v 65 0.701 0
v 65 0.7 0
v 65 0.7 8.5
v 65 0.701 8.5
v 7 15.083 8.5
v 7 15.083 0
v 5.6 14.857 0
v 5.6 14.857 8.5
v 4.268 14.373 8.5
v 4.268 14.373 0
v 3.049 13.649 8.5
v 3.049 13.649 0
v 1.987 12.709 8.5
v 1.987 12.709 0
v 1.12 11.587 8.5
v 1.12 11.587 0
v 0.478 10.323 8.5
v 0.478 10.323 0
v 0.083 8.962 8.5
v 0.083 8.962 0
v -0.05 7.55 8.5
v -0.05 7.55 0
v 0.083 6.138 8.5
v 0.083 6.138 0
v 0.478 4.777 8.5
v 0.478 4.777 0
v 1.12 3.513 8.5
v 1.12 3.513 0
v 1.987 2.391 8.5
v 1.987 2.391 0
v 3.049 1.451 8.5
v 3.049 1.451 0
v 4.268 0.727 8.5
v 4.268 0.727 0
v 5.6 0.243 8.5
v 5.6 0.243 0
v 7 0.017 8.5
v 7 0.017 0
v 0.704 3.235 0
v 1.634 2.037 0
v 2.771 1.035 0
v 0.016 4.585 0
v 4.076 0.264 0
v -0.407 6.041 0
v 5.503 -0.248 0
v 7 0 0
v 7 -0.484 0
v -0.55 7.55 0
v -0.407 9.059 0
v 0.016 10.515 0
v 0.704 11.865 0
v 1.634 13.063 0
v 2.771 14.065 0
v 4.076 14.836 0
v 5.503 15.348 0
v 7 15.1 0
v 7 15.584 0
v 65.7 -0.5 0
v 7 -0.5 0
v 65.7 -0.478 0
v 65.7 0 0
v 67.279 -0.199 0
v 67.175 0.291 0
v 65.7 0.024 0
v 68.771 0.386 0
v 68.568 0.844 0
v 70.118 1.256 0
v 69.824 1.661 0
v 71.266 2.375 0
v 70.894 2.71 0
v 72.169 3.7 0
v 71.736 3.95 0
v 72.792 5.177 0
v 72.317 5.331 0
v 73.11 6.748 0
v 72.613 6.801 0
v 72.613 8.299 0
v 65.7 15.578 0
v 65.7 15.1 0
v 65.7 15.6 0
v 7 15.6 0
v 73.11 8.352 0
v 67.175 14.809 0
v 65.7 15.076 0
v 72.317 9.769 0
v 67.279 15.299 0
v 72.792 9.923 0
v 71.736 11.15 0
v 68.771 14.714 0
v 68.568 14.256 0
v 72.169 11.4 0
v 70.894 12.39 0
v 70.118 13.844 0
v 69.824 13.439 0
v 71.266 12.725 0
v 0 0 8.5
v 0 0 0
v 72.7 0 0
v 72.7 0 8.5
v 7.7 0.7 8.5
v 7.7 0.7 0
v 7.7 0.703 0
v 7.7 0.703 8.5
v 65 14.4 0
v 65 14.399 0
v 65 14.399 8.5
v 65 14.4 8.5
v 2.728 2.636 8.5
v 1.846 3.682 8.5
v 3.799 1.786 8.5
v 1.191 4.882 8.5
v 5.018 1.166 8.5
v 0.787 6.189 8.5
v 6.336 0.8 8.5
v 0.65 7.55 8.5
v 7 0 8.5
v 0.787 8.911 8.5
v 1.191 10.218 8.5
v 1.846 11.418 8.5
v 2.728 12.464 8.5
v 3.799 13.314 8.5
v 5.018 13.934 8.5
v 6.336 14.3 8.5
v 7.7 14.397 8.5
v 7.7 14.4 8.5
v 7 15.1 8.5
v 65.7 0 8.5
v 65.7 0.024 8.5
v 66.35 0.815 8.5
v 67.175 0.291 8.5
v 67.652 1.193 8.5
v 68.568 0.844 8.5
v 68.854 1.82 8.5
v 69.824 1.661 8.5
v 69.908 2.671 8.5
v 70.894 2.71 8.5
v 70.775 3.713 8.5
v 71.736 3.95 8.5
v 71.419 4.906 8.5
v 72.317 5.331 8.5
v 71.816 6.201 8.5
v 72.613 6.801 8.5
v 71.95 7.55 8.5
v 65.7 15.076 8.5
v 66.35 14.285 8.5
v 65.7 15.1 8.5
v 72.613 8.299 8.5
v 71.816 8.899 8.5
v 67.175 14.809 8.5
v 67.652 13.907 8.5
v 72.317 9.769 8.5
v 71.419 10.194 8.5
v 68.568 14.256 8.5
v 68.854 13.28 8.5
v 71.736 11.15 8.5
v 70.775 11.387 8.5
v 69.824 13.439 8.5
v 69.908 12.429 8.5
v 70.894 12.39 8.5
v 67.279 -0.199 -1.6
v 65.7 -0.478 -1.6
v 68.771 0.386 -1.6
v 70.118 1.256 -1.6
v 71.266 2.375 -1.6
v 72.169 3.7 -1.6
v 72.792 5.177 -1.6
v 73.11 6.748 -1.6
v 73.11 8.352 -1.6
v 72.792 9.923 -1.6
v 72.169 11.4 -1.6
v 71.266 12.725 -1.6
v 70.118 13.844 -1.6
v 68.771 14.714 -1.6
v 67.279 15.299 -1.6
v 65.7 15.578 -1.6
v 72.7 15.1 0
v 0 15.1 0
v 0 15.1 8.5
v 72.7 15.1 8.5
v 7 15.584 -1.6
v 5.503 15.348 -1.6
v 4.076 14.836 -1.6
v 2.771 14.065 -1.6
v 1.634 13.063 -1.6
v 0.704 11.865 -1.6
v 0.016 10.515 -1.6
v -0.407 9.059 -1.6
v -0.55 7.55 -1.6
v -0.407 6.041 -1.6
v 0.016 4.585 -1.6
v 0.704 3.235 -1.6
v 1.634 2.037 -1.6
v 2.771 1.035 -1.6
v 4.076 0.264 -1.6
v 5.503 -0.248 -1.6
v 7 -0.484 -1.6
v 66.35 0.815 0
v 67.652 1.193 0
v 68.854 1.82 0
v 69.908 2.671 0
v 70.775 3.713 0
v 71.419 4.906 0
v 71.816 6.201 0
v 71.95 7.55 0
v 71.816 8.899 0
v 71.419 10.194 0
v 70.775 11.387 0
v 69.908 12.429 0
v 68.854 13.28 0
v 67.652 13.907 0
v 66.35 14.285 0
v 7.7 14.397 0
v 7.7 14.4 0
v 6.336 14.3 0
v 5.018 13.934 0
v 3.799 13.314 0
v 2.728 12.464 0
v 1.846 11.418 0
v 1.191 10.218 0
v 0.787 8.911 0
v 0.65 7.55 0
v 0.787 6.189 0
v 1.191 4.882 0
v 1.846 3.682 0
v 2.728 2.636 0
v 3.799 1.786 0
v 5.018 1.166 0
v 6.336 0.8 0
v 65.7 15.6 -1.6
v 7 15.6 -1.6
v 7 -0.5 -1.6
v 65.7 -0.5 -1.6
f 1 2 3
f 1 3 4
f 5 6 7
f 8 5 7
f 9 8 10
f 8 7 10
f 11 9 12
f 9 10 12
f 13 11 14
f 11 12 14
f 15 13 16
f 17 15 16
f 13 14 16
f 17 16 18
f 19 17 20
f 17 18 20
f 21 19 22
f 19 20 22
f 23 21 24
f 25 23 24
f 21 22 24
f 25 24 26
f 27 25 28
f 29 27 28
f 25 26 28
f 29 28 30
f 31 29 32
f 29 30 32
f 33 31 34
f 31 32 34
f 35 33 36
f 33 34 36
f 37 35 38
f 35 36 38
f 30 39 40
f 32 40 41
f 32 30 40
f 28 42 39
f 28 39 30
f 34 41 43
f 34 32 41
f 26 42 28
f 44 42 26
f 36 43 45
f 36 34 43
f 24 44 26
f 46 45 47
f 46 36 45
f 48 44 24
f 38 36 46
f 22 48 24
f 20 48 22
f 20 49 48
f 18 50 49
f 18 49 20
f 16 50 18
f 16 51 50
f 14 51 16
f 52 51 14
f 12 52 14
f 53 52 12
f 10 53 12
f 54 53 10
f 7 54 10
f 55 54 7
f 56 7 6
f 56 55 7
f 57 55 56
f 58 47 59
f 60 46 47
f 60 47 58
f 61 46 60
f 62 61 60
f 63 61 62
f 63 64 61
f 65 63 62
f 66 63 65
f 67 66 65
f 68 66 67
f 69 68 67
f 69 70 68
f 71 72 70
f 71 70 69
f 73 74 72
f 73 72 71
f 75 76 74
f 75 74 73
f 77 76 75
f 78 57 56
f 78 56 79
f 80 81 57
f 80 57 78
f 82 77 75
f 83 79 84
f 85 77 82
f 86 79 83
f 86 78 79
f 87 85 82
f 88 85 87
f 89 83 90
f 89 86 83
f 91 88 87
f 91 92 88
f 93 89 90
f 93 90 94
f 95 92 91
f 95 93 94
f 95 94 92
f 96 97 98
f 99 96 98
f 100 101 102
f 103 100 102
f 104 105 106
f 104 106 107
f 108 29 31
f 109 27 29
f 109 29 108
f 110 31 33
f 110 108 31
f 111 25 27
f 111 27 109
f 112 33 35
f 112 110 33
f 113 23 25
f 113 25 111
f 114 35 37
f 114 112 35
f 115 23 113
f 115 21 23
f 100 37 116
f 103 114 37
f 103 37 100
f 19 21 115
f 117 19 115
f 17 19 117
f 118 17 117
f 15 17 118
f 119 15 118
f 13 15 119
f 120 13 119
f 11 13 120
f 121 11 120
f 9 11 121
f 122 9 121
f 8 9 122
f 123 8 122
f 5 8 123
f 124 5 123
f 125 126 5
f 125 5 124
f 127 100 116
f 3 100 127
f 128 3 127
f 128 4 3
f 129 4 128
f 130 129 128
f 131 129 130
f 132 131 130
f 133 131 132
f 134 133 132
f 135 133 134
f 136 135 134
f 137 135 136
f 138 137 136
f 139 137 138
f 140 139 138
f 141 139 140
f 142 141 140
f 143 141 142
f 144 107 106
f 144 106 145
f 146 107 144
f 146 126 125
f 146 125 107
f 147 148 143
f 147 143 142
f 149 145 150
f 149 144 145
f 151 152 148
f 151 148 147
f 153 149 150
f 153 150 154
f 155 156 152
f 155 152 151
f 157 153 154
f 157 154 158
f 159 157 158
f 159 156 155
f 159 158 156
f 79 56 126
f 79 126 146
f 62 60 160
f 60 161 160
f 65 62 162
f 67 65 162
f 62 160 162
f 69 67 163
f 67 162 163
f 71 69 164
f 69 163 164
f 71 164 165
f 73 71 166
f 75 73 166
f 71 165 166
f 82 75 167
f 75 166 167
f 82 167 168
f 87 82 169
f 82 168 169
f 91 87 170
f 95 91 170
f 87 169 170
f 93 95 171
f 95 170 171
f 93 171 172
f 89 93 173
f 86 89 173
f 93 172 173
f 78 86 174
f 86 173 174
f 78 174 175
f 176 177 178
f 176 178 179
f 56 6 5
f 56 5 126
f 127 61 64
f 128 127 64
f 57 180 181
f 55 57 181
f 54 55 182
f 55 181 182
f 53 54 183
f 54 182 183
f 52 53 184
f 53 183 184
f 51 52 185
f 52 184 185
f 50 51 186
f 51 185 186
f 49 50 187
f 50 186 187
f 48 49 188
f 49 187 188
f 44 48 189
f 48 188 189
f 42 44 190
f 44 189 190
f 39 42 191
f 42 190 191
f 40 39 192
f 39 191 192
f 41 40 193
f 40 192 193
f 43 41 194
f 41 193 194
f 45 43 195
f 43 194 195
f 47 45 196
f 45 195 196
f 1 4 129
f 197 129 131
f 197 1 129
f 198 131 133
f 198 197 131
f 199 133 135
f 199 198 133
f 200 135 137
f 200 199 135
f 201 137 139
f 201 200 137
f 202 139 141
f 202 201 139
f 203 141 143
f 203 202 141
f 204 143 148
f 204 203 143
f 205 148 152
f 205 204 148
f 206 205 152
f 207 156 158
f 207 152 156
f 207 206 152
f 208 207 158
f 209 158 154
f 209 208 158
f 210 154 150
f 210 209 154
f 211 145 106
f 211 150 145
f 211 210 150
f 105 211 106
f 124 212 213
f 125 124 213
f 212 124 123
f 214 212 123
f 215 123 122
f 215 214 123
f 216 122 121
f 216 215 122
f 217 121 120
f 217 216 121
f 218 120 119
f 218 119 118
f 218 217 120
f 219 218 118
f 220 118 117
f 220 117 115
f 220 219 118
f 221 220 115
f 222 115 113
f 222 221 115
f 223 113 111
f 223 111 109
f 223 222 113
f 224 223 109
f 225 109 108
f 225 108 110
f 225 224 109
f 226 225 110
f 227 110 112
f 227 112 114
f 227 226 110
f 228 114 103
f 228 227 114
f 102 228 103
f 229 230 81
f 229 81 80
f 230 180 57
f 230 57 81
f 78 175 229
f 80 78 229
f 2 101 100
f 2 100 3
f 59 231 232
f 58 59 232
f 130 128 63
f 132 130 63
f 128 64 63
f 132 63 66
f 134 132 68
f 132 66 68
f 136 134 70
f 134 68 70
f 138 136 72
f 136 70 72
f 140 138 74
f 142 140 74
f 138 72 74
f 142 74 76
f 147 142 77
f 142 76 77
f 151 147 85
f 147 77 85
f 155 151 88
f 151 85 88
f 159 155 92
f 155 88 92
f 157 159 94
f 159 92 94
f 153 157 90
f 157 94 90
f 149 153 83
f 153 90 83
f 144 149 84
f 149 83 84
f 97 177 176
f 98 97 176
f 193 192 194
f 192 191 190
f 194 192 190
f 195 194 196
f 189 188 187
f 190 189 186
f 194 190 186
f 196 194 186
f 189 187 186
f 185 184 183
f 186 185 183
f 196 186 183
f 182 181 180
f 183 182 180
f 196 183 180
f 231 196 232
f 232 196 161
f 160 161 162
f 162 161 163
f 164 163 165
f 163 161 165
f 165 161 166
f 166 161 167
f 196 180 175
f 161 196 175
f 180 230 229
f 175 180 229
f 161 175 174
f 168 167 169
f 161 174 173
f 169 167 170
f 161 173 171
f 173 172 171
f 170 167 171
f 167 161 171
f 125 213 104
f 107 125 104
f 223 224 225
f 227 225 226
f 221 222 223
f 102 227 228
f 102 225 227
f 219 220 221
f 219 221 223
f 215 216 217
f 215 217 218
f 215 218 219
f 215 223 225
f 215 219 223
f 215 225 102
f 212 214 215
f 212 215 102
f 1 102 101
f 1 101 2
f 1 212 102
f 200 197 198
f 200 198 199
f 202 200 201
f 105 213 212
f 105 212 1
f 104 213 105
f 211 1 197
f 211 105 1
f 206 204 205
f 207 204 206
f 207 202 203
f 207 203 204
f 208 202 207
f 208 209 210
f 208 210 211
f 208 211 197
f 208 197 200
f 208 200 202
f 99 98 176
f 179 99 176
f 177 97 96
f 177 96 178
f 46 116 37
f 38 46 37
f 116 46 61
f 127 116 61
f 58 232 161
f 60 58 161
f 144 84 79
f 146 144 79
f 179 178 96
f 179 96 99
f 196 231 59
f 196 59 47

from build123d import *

# Parameters (mm, degrees)
BOX_W             = 72.7
BOX_H             = 15.1
BOX_DEPTH         = 8.5
CYLINDER003_R     = 8.05
CYLINDER003_DEPTH = 1.6
BOX002_W          = 58.7
BOX002_H          = 16.1
BOX002_DEPTH      = 1.6
CYLINDER002_R     = 8.05
CYLINDER002_DEPTH = 1.6
CYLINDER004_R     = 6.85
CYLINDER004_DEPTH = 8.5
CYLINDER005_R     = 6.85
CYLINDER005_DEPTH = 8.5
BOX003_W          = 57.3
BOX003_H          = 13.7
BOX003_DEPTH      = 8.5
CYLINDER001_R     = 7.55
CYLINDER001_DEPTH = 8.5
BOX001_W          = 58.7
BOX001_H          = 15.1
BOX001_DEPTH      = 8.5
CYLINDER_R        = 7.55
CYLINDER_DEPTH    = 8.5


with BuildPart() as cube:
    # Box → Box (new body)
    with BuildSketch(Plane.XY):
        with Locations((36.35, 7.55)):
            Rectangle(BOX_W, BOX_H)
    extrude(amount=BOX_DEPTH)


with BuildPart() as cylinder003:
    # Cylinder003 → Cylinder003 (new body)
    with BuildSketch(Plane(origin=(65.1, 7.55, 0), x_dir=(1, 0, 0), z_dir=(0, 0, 1))):
        Circle(CYLINDER003_R)
    extrude(amount=CYLINDER003_DEPTH)


with BuildPart() as cube002:
    # Box002 → Box002 (new body)
    with BuildSketch(Plane(origin=(7, -0.5, 0), x_dir=(1, 0, 0), z_dir=(0, 0, 1))):
        with Locations((29.35, 8.05)):
            Rectangle(BOX002_W, BOX002_H)
    extrude(amount=BOX002_DEPTH)


with BuildPart() as fusion002:
    # Cylinder002 → Cylinder002 (new body)
    with BuildSketch(Plane(origin=(7.5, 7.55, 0), x_dir=(1, 0, 0), z_dir=(0, 0, 1))):
        Circle(CYLINDER002_R)
    extrude(amount=CYLINDER002_DEPTH)

    # Fusion002: union Cylinder003, Cube002
    add(cylinder003.part)
    add(cube002.part)


with BuildPart() as fusion002_1:
    # Fusion002 placement: moved
    add(fusion002.part.moved(Location((0, 0, -1.6))))


with BuildPart() as cylinder004:
    # Cylinder004 → Cylinder004 (new body)
    with BuildSketch(Plane(origin=(65.1, 7.55, 0), x_dir=(1, 0, 0), z_dir=(0, 0, 1))):
        Circle(CYLINDER004_R)
    extrude(amount=CYLINDER004_DEPTH)


with BuildPart() as cylinder005:
    # Cylinder005 → Cylinder005 (new body)
    with BuildSketch(Plane(origin=(7.5, 7.55, 0), x_dir=(1, 0, 0), z_dir=(0, 0, 1))):
        Circle(CYLINDER005_R)
    extrude(amount=CYLINDER005_DEPTH)


with BuildPart() as fusion001:
    # Box003 → Box003 (new body)
    with BuildSketch(Plane(origin=(7.7, 0.7, 0), x_dir=(1, 0, 0), z_dir=(0, 0, 1))):
        with Locations((28.65, 6.85)):
            Rectangle(BOX003_W, BOX003_H)
    extrude(amount=BOX003_DEPTH)

    # Fusion001: union Cylinder004, Cylinder005
    add(cylinder004.part)
    add(cylinder005.part)


with BuildPart() as cylinder001:
    # Cylinder001 → Cylinder001 (new body)
    with BuildSketch(Plane(origin=(65.1, 7.55, 0), x_dir=(1, 0, 0), z_dir=(0, 0, 1))):
        Circle(CYLINDER001_R)
    extrude(amount=CYLINDER001_DEPTH)


with BuildPart() as cube001:
    # Box001 → Box001 (new body)
    with BuildSketch(Plane(origin=(7, 0, 0), x_dir=(1, 0, 0), z_dir=(0, 0, 1))):
        with Locations((29.35, 7.55)):
            Rectangle(BOX001_W, BOX001_H)
    extrude(amount=BOX001_DEPTH)


with BuildPart() as fusion003:
    # Cylinder → Cylinder (new body)
    with BuildSketch(Plane(origin=(7.5, 7.55, 0), x_dir=(1, 0, 0), z_dir=(0, 0, 1))):
        Circle(CYLINDER_R)
    extrude(amount=CYLINDER_DEPTH)

    # Fusion: union Cylinder001, Cube001
    add(cylinder001.part)
    add(cube001.part)

    # Cut: cut Fusion001
    add(fusion001.part, mode=Mode.SUBTRACT)

    # Fusion003: union Fusion002
    add(fusion002_1.part)


solid = Compound([cube.part, fusion003.part])
